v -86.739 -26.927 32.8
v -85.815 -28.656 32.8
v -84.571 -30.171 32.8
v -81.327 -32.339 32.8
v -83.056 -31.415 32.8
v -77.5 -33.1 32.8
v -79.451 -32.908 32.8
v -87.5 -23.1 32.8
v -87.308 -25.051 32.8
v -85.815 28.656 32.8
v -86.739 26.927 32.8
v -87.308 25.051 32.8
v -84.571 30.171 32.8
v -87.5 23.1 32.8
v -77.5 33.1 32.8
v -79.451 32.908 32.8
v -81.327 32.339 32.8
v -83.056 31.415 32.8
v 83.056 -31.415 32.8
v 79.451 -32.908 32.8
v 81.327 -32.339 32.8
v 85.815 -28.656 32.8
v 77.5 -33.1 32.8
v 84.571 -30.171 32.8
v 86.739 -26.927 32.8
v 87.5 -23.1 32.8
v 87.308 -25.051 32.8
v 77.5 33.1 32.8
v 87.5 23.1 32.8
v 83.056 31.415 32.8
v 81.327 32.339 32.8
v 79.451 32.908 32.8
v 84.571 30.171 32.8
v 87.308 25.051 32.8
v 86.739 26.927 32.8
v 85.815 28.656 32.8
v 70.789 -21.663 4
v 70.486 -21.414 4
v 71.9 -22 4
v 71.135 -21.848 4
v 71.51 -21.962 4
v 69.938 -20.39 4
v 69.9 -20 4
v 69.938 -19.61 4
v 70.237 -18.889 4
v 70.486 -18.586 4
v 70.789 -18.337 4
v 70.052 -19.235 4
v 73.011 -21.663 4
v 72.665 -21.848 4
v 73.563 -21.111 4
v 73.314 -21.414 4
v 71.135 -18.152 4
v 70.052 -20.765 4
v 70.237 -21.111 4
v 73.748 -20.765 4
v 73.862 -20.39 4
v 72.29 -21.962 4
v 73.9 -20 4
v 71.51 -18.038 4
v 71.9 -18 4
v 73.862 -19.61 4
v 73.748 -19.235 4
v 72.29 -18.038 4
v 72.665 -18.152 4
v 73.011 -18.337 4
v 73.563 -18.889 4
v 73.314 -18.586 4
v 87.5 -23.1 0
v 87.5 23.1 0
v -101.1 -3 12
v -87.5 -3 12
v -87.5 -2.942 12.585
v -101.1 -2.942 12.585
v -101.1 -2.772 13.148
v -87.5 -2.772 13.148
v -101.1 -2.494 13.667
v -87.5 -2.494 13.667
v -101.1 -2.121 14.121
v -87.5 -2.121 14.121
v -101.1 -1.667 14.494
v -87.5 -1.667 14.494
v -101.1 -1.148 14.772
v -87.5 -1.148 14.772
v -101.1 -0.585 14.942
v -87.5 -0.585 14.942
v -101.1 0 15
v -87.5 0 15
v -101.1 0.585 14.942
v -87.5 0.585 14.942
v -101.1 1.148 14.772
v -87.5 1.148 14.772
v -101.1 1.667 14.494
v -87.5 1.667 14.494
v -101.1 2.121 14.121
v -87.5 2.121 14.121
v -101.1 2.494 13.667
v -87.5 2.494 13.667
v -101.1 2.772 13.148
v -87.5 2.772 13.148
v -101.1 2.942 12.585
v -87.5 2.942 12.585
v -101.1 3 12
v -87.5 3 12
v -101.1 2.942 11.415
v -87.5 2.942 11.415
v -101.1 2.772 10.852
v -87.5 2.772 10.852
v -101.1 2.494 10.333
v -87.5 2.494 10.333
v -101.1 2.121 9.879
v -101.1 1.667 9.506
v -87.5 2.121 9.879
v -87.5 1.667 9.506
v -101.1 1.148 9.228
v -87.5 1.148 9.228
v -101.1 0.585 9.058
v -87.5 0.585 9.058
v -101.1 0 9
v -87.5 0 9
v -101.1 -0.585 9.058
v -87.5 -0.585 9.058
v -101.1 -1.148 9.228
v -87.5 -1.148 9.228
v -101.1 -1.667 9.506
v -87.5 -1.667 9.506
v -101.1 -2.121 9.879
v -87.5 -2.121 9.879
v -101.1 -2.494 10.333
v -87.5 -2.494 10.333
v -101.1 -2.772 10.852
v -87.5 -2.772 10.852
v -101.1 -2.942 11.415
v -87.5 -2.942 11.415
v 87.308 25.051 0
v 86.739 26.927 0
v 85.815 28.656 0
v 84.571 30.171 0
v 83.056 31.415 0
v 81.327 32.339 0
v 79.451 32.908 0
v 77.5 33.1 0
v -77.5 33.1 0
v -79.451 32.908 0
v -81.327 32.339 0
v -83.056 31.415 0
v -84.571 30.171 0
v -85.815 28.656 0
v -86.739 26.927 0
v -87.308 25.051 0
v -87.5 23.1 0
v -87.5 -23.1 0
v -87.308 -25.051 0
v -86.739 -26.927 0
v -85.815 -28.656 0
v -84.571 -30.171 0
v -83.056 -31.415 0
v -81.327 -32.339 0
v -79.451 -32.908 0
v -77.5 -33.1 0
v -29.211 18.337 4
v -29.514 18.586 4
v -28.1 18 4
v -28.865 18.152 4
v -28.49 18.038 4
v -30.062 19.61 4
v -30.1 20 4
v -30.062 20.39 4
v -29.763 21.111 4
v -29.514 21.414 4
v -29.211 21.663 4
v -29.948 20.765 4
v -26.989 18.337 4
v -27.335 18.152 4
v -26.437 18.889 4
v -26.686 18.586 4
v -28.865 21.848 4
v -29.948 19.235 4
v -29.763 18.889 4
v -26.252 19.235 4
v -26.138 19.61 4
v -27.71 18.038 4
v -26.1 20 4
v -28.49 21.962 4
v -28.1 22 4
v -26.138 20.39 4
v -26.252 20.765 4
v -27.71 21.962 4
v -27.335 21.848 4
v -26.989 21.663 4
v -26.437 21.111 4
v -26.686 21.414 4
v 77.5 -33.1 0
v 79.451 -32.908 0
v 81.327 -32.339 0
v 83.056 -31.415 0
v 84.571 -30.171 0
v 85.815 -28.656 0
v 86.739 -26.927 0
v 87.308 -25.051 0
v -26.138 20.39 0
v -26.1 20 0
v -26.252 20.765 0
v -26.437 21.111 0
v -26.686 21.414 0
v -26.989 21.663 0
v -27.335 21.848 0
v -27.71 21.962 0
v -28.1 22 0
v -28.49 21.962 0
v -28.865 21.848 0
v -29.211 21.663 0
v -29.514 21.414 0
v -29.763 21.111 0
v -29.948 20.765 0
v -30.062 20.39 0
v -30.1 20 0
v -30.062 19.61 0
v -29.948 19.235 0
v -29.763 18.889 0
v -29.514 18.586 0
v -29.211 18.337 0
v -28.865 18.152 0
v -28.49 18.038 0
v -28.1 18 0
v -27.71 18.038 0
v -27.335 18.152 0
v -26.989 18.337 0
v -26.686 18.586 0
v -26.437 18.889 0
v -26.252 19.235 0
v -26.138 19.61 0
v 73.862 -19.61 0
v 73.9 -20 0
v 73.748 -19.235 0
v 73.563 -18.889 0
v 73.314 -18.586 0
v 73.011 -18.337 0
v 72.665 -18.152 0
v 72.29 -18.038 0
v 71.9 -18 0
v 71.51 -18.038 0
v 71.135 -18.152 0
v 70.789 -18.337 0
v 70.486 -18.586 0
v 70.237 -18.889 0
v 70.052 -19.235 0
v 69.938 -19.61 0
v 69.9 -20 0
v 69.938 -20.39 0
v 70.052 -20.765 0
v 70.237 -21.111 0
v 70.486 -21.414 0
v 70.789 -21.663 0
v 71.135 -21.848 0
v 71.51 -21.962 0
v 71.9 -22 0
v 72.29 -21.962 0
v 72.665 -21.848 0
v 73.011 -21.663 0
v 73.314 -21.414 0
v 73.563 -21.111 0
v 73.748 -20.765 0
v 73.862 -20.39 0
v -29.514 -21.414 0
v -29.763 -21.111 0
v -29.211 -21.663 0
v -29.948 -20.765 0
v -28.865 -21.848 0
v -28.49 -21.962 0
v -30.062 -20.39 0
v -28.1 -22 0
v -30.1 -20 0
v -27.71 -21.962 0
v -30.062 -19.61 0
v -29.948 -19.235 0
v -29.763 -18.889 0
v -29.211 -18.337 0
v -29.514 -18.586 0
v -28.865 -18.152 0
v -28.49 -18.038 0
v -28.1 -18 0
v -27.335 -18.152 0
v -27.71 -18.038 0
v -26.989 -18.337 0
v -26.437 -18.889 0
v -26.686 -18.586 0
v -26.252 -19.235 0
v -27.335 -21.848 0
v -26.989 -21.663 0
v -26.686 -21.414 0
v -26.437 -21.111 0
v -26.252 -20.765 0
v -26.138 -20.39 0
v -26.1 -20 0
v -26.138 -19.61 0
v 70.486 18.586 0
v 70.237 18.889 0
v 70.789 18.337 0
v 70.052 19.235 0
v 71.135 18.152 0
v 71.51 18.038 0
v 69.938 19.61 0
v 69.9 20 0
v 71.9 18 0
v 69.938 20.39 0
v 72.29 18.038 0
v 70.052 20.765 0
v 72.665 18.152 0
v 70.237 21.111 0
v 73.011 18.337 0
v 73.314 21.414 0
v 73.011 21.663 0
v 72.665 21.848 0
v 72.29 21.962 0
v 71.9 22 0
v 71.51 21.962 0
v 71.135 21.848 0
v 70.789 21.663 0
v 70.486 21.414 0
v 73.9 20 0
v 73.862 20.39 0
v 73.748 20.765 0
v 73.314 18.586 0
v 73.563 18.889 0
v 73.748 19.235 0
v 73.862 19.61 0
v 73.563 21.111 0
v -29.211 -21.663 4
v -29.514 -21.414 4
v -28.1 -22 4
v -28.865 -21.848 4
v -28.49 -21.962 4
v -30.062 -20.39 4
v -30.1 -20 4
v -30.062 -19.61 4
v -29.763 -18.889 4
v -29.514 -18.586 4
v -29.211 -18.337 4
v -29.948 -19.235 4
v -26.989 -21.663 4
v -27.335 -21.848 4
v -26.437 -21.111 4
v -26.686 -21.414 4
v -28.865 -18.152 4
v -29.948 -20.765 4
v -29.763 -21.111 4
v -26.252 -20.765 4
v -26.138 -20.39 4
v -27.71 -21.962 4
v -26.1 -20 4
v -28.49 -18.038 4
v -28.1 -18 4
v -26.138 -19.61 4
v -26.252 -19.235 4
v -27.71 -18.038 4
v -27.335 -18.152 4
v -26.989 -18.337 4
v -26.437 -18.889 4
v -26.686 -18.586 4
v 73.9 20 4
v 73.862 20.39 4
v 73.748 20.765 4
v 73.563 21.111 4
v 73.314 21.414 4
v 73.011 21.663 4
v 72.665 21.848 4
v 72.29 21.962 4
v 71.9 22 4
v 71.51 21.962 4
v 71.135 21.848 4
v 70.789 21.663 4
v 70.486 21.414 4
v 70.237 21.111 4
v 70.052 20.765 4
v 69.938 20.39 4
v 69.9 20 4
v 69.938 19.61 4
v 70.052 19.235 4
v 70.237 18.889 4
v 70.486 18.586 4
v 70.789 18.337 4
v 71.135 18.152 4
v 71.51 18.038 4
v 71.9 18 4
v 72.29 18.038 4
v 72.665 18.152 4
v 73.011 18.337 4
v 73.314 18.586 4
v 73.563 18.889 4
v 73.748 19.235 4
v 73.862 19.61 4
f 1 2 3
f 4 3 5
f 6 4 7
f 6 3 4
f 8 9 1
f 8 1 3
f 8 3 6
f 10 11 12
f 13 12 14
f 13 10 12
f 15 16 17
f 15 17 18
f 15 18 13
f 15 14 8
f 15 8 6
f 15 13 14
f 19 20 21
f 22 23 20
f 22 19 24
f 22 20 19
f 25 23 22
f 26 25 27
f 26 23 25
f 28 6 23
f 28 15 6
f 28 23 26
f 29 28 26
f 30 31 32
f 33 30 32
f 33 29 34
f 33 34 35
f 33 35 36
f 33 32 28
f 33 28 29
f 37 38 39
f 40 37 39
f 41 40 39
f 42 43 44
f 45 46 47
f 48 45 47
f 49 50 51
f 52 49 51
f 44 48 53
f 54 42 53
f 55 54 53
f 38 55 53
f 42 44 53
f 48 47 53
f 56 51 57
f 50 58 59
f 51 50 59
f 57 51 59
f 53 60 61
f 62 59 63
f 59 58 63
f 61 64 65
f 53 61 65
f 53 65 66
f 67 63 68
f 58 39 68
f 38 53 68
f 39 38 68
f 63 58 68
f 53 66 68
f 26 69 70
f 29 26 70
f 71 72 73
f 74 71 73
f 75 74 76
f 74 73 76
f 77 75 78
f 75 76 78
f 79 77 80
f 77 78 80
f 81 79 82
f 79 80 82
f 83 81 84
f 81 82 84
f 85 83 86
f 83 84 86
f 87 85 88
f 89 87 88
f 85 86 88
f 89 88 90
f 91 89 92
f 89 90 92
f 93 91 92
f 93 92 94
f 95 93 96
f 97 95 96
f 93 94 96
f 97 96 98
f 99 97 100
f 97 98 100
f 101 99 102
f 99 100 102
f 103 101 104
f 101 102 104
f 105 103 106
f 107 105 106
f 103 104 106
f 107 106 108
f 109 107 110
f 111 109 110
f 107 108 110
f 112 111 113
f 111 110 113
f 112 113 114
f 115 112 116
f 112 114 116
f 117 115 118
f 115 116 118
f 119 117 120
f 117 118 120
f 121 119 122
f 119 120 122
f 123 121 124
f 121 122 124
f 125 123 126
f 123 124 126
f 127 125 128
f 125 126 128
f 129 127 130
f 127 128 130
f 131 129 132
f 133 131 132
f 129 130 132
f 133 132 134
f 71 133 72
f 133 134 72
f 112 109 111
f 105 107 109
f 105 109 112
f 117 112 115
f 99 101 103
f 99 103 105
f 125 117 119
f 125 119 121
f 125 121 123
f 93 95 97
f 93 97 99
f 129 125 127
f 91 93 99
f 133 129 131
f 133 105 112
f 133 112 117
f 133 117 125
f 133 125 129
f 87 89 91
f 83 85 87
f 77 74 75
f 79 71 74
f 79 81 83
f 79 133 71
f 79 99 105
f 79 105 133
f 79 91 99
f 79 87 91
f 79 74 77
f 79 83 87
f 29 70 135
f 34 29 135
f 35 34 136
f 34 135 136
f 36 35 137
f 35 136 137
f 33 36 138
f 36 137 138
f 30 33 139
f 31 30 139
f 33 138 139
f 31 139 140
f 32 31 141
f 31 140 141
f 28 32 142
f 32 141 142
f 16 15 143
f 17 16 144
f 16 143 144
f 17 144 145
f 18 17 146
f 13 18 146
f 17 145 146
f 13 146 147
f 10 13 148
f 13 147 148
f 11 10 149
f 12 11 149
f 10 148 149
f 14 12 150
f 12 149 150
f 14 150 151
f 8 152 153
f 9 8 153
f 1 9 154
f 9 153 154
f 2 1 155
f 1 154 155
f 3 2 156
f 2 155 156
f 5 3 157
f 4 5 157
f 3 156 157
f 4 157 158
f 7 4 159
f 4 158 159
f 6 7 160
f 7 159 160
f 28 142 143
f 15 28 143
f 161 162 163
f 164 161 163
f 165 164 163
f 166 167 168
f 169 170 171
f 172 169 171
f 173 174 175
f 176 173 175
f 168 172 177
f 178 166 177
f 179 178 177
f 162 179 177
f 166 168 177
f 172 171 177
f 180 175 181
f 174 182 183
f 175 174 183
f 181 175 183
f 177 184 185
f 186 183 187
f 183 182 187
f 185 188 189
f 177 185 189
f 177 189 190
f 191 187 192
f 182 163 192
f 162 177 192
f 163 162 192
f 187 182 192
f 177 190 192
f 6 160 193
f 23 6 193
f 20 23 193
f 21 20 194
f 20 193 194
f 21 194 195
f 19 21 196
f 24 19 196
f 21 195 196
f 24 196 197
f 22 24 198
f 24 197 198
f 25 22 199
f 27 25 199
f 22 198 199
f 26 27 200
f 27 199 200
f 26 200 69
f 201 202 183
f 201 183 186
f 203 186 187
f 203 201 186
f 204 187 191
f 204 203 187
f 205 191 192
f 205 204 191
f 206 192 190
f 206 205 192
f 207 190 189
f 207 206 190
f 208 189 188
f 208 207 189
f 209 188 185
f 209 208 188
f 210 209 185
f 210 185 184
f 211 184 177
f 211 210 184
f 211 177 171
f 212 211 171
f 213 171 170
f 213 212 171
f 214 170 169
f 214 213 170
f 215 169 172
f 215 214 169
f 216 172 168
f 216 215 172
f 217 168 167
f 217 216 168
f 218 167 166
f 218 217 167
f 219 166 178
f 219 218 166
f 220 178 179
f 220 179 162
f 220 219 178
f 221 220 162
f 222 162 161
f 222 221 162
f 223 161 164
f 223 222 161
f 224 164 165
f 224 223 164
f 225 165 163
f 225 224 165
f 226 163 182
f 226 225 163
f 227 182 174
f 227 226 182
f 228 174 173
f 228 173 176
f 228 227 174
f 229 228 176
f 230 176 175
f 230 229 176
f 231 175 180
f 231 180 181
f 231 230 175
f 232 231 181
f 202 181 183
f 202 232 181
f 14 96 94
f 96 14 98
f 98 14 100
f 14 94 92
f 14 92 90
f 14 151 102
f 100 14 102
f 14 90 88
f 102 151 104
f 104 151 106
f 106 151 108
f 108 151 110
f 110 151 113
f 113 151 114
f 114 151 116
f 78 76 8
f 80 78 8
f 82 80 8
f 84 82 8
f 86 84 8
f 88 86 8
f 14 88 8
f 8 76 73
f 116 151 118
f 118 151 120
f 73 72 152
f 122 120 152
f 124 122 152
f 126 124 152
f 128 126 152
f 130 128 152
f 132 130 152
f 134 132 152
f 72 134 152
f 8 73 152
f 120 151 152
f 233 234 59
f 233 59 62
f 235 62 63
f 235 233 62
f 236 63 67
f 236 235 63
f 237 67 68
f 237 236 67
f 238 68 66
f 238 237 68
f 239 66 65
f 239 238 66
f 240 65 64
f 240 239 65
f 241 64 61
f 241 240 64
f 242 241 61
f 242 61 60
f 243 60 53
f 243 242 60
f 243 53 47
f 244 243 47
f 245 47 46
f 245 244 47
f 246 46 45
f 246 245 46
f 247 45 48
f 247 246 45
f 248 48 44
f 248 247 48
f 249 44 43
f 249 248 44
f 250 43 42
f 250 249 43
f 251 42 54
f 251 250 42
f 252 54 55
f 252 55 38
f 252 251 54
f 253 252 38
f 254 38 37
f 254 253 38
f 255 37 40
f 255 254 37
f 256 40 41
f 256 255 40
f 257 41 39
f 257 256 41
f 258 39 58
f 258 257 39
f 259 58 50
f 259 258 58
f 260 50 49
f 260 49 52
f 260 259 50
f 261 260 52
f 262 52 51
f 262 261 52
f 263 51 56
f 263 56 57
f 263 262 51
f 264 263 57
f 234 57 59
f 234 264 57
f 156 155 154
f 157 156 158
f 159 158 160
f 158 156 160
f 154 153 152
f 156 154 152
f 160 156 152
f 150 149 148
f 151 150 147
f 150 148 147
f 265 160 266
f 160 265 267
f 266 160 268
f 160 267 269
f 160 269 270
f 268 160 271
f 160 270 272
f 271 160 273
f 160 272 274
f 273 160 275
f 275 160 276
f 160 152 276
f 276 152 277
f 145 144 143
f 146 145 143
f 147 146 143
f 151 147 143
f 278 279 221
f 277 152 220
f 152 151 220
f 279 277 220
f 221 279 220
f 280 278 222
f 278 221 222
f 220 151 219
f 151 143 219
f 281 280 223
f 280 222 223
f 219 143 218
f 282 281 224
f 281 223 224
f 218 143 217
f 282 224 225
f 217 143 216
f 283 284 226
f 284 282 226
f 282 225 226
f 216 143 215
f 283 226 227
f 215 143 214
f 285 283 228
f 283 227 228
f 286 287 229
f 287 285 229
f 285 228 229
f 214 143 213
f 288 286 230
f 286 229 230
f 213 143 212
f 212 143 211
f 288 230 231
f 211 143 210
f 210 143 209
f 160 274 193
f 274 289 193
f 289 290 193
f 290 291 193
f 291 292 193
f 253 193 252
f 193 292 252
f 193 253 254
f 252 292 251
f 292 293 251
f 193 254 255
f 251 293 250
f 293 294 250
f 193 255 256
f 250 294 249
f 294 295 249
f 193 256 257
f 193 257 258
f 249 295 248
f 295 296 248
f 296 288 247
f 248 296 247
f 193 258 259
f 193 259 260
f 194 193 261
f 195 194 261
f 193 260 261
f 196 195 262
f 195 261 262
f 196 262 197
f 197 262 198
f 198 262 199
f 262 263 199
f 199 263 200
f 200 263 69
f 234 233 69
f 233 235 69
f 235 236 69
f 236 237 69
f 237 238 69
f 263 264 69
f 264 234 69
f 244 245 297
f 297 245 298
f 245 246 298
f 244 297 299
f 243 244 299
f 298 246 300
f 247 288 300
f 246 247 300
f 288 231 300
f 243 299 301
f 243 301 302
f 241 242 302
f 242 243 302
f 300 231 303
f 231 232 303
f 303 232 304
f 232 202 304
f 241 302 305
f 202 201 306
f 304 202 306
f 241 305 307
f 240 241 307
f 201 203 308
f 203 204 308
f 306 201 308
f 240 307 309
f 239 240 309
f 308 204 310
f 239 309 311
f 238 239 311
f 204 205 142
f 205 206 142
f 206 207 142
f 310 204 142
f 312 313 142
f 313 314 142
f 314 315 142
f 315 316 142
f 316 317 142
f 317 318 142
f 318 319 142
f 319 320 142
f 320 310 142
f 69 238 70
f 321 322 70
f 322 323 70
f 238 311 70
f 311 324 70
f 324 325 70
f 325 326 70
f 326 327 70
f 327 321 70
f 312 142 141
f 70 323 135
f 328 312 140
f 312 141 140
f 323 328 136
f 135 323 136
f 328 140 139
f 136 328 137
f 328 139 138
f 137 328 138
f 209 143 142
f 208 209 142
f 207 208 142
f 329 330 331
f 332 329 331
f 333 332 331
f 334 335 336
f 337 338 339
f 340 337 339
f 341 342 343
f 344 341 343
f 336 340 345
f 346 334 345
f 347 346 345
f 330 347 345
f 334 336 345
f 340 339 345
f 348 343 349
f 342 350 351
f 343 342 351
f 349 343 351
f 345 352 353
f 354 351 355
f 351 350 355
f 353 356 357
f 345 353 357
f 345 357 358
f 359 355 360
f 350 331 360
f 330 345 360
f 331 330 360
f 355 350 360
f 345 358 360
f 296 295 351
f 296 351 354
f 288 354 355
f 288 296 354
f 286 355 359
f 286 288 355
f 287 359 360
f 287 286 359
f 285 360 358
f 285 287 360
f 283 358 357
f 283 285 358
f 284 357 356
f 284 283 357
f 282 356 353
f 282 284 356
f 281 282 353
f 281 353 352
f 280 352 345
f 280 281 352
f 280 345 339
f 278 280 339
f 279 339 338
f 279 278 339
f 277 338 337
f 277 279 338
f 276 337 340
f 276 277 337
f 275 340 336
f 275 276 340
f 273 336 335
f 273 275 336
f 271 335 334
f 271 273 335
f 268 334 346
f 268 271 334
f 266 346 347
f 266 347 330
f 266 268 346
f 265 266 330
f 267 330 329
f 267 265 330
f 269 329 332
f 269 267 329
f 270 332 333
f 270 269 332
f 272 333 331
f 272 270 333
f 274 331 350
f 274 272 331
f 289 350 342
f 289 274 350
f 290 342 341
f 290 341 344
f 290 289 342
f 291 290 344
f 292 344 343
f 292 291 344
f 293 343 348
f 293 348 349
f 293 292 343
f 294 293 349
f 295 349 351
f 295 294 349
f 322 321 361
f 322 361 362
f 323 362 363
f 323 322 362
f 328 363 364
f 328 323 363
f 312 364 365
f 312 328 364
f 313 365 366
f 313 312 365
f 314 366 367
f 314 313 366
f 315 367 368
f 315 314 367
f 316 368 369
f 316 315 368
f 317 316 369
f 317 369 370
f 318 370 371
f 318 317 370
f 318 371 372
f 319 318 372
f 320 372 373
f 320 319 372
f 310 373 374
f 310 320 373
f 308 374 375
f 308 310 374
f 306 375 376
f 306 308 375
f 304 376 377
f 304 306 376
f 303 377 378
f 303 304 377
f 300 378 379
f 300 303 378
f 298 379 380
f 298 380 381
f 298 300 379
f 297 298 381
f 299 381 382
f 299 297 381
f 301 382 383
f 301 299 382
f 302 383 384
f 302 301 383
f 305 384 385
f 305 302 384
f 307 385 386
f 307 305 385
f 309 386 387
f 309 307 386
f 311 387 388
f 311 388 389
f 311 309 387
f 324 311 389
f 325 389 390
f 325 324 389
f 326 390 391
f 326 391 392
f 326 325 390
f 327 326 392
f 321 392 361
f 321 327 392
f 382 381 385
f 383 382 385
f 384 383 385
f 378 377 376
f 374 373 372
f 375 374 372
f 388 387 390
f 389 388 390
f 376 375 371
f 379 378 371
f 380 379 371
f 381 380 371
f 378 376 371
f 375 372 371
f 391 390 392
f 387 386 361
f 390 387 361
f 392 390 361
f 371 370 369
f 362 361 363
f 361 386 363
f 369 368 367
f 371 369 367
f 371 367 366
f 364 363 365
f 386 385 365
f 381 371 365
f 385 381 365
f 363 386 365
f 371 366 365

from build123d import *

# Parameters (mm, degrees)
F0_R     = 2
F1_DEPTH = 32.8
F2_R     = 3
F3_DEPTH = 13.6
F4_DEPTH = 4


with BuildPart() as f1:
    # F0 (on Top) → F1 (new body)
    with BuildSketch(Plane.XY):
        with BuildLine():
            Line((77.5, 33.1), (-77.5, 33.1))
            ThreePointArc((-77.5, 33.1), (-84.571068, 30.171068), (-87.5, 23.1))
            Line((-87.5, 23.1), (-87.5, -23.1))
            ThreePointArc((-87.5, -23.1), (-84.571068, -30.171068), (-77.5, -33.1))
            Line((-77.5, -33.1), (77.5, -33.1))
            ThreePointArc((77.5, -33.1), (84.571068, -30.171068), (87.5, -23.1))
            Line((87.5, -23.1), (87.5, 23.1))
            ThreePointArc((87.5, 23.1), (84.571068, 30.171068), (77.5, 33.1))
        make_face()
        with Locations((-28.1, -20)):
            Circle(F0_R, mode=Mode.SUBTRACT)
        with Locations((71.9, -20)):
            Circle(F0_R, mode=Mode.SUBTRACT)
        with Locations((-28.1, 20)):
            Circle(F0_R, mode=Mode.SUBTRACT)
        with Locations((71.9, 20)):
            Circle(F0_R, mode=Mode.SUBTRACT)
        with Locations((-28.1, 20)):
            Circle(F0_R)
        with Locations((-28.1, -20)):
            Circle(F0_R)
        with Locations((71.9, 20)):
            Circle(F0_R)
        with Locations((71.9, -20)):
            Circle(F0_R)
    extrude(amount=F1_DEPTH)

    # F2 (on face) → F3 (join)
    with BuildSketch(Plane(origin=(-87.5, 0, 0), x_dir=(0, -1, 0), z_dir=(-1, 0, 0))):
        with Locations((0, 12)):
            Circle(F2_R)
    extrude(amount=F3_DEPTH)

    # F0 (on Top) → F4 (cut)
    with BuildSketch(Plane.XY):
        with Locations((-28.1, -20)):
            Circle(F0_R)
        with Locations((-28.1, 20)):
            Circle(F0_R)
        with Locations((71.9, 20)):
            Circle(F0_R)
        with Locations((71.9, -20)):
            Circle(F0_R)
    extrude(amount=F4_DEPTH, mode=Mode.SUBTRACT)


solid = f1.part
